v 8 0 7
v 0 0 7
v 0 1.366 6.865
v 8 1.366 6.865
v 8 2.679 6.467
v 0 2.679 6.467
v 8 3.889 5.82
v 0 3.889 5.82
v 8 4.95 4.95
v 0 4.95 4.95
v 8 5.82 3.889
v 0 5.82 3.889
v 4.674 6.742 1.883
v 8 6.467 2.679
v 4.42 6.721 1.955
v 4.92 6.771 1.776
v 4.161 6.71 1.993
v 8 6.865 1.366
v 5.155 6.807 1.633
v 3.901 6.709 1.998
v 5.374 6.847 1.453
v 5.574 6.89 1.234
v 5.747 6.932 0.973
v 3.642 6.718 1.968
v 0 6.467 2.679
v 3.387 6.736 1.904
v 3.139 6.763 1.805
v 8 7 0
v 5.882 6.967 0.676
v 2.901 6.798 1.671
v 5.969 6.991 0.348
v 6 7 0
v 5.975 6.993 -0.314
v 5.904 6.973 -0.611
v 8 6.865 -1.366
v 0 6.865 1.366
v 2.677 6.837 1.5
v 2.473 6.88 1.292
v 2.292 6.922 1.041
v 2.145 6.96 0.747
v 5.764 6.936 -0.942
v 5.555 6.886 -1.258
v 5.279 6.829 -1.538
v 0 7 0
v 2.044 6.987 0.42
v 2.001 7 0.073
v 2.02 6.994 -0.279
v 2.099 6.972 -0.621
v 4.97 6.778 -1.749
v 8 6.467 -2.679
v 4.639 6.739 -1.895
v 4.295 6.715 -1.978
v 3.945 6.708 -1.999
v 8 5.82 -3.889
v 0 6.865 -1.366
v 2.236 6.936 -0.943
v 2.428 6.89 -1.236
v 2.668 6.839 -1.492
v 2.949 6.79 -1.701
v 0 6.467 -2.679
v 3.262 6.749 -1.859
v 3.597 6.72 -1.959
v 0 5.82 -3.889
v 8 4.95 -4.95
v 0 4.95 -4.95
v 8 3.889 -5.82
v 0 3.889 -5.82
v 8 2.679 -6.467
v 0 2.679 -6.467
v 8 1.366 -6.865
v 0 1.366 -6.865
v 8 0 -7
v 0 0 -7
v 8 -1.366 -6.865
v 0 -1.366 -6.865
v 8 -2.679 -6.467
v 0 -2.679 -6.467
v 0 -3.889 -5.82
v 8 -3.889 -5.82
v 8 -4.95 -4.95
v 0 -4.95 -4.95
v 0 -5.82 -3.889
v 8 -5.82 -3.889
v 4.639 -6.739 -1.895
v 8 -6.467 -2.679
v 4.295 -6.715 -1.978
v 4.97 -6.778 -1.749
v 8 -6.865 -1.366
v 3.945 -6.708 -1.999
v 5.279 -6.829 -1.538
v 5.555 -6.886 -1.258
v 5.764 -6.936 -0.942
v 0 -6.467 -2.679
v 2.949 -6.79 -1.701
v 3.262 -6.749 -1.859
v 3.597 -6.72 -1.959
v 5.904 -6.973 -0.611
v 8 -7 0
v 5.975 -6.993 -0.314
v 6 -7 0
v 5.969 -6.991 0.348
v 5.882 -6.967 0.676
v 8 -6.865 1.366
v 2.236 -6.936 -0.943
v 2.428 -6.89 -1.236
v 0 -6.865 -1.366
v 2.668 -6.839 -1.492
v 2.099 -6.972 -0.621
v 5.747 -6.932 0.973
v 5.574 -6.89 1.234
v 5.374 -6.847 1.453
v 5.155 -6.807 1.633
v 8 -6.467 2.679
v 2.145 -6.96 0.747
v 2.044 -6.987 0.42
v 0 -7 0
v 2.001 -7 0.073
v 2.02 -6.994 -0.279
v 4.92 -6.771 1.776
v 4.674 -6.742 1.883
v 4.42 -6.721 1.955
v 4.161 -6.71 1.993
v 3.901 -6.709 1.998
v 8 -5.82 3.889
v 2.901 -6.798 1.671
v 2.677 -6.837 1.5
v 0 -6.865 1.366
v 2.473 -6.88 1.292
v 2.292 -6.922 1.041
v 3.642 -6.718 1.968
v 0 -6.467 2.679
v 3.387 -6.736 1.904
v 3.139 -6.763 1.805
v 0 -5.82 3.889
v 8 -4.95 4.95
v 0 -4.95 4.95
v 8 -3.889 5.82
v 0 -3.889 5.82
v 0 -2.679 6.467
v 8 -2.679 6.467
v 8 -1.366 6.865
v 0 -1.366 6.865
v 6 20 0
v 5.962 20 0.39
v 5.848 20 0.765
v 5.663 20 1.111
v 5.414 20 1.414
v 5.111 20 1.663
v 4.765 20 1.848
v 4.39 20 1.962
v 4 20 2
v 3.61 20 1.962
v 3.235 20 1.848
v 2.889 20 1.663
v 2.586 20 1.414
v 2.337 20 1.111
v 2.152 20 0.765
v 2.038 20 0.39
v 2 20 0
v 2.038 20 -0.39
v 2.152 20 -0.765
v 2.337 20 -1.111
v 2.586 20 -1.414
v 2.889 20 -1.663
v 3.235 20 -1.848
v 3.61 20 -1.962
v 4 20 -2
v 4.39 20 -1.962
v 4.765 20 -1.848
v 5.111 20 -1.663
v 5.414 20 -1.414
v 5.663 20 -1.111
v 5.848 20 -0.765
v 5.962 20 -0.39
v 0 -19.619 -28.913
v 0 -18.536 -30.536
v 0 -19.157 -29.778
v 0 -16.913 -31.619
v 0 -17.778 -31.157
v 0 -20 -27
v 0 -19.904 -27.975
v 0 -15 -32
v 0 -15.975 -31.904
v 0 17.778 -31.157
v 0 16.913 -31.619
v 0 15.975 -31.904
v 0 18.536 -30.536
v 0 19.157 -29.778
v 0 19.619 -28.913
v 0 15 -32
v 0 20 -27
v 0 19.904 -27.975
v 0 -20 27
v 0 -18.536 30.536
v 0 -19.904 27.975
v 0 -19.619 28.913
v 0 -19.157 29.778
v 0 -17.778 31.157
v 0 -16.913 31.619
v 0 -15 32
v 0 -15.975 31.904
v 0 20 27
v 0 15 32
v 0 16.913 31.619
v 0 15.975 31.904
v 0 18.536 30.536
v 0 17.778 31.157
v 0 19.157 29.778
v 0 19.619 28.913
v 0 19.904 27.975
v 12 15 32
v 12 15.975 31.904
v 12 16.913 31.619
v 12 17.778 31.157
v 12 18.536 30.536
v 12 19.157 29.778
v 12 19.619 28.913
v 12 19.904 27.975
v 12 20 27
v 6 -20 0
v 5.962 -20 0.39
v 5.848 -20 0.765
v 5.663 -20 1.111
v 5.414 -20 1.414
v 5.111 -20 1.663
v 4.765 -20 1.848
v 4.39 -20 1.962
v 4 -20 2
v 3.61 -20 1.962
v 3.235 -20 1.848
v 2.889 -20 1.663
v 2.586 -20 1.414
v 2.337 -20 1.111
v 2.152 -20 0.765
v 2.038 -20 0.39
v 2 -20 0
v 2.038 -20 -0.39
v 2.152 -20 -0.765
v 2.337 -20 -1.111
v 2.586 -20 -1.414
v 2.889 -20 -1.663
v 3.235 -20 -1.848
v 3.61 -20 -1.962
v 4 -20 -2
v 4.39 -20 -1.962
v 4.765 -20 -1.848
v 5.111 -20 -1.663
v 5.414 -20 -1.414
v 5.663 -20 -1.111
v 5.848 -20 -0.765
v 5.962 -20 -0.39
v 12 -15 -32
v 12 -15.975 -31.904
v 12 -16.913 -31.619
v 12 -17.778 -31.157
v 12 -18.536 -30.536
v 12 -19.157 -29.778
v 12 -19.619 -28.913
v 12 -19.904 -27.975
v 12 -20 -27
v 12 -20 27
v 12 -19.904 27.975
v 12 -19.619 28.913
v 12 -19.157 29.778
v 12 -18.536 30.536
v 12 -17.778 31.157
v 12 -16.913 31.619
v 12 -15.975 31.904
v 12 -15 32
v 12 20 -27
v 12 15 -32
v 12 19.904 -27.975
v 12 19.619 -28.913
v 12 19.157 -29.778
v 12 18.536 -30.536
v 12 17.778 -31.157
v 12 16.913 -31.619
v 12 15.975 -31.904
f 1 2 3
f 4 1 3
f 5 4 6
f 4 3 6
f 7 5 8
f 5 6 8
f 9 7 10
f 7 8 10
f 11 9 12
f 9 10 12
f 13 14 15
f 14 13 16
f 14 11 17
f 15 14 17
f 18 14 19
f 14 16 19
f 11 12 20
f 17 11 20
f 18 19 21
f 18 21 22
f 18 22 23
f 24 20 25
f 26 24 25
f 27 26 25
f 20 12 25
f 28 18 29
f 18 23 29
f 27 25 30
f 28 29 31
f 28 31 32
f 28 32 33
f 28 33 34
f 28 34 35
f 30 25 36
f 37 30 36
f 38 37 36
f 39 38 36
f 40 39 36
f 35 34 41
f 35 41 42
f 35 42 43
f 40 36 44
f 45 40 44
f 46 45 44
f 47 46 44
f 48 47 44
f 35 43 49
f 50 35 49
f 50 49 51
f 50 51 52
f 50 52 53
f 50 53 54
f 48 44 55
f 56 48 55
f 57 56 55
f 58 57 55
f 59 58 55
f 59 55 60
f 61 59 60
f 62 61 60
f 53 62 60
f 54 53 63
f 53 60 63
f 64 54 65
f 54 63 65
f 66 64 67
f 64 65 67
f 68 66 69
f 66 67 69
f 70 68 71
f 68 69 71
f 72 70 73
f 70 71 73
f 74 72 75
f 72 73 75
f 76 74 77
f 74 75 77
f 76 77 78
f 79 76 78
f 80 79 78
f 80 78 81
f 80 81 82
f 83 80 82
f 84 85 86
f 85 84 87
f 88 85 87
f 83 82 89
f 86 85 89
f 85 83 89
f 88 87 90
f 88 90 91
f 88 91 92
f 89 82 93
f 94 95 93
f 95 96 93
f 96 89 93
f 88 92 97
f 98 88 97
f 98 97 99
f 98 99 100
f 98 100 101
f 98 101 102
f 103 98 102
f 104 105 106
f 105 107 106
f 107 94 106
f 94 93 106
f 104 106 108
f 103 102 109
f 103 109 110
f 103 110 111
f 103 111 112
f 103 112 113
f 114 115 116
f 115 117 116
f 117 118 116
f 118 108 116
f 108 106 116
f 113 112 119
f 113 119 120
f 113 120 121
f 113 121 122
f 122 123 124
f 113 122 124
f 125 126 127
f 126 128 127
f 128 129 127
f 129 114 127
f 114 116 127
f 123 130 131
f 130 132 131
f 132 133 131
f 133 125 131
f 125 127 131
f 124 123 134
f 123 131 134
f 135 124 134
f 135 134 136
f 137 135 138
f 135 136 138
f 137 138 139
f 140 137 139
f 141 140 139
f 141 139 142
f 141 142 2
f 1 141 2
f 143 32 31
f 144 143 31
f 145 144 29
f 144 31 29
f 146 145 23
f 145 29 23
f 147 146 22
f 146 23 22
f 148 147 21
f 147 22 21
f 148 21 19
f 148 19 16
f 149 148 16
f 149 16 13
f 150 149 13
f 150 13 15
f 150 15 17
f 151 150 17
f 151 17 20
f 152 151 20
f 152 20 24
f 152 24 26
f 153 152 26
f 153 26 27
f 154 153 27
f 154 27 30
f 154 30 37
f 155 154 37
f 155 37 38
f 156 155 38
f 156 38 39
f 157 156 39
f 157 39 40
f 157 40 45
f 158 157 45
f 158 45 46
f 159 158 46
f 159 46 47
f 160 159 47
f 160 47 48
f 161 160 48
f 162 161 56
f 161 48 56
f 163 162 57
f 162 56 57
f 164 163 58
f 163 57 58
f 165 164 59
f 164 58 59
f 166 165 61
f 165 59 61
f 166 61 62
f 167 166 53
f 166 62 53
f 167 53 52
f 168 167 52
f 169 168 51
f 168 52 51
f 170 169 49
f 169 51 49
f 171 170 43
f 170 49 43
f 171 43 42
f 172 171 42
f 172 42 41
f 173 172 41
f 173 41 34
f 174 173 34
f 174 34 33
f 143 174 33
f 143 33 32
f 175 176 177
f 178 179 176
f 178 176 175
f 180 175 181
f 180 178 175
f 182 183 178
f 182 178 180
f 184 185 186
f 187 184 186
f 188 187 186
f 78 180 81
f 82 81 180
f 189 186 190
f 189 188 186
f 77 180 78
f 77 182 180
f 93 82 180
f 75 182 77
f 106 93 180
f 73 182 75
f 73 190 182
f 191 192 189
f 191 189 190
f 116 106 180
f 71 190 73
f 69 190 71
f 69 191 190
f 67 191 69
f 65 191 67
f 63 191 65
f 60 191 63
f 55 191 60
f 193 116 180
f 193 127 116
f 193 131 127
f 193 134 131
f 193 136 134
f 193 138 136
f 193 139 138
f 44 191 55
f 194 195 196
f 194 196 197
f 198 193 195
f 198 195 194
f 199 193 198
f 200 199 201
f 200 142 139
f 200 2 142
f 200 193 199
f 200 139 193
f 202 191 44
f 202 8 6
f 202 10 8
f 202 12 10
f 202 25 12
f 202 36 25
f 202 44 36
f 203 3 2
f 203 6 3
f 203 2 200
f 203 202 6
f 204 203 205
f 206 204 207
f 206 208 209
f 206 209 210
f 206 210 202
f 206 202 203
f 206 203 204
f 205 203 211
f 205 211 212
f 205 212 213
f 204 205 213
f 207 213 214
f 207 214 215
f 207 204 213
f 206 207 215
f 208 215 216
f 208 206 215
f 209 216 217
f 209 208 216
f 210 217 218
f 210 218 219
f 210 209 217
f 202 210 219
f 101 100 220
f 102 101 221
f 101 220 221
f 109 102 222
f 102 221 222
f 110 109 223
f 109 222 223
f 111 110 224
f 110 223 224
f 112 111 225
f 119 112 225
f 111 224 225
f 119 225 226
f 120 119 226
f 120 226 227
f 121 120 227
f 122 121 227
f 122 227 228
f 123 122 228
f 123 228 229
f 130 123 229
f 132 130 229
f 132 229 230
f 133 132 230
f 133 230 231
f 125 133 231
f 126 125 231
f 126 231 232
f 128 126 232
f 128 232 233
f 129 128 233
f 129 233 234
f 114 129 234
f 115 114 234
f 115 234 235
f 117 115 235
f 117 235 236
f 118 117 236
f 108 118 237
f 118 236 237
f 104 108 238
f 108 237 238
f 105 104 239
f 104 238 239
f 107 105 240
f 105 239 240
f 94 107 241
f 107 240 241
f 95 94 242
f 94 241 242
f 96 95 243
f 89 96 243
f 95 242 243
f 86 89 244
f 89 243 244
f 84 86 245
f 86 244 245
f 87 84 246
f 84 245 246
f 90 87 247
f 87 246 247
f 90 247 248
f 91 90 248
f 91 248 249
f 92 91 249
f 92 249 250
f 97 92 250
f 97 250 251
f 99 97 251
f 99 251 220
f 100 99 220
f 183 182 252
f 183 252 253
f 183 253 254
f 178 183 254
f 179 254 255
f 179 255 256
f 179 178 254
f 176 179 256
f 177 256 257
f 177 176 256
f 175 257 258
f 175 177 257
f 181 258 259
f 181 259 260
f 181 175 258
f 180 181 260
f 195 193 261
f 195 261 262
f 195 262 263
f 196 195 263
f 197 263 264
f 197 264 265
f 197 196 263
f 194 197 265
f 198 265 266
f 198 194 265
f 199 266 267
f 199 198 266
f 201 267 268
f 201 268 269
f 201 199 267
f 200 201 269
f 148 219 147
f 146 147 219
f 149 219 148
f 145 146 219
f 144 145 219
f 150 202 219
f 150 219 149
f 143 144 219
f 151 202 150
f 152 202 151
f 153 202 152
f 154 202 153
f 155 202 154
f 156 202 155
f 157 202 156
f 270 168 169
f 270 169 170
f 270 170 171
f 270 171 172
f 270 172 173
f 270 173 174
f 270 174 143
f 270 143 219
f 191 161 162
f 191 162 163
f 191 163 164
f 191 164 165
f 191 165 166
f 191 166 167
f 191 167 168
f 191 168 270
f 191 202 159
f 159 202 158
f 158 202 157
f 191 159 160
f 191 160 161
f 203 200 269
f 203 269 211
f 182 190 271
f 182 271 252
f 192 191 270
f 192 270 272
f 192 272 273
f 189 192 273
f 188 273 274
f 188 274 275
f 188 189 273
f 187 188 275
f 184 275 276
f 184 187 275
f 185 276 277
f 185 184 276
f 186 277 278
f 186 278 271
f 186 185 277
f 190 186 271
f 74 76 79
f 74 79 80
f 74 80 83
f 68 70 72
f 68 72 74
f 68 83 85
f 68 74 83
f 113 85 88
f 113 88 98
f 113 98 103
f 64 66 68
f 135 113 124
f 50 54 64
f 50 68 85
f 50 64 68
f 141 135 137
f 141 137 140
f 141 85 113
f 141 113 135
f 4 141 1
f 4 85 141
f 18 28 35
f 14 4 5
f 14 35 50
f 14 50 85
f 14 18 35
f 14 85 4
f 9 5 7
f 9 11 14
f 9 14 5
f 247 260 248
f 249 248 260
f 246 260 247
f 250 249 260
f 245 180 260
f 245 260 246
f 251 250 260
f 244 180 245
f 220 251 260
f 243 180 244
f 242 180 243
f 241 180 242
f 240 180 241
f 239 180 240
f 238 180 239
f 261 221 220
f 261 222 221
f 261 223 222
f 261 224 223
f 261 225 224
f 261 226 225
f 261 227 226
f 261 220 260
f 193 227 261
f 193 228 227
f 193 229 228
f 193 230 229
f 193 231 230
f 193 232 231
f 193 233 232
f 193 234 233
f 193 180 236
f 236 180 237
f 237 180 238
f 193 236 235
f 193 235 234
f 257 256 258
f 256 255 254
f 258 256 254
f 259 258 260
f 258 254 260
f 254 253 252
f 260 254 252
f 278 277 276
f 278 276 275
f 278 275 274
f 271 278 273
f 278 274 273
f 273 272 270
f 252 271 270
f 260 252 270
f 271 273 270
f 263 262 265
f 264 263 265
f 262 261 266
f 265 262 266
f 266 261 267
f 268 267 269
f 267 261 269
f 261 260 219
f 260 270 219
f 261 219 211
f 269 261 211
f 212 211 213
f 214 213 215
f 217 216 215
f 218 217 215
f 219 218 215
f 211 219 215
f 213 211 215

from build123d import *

# Parameters (mm, degrees)
EXTRUDE_1_DEPTH     = 12
SKETCH_2_R          = 7
CUT_EXTRUDE_1_DEPTH = 8
SKETCH_5_R          = 2
CUT_EXTRUDE_2_DEPTH = 41


with BuildPart() as part:
    # 草图1 → 凸台-拉伸1 (new body)
    with BuildSketch(Plane(origin=(0, 0, 0), x_dir=(0, 0, -1), z_dir=(1, 0, 0))):
        with BuildLine():
            Line((-27, 20), (27, 20))
            ThreePointArc((27, 20), (30.535533906, 18.535533906), (32, 15))
            Line((32, 15), (32, -15))
            ThreePointArc((32, -15), (30.535533906, -18.535533906), (27, -20))
            Line((27, -20), (-27, -20))
            ThreePointArc((-27, -20), (-30.535533906, -18.535533906), (-32, -15))
            Line((-32, -15), (-32, 15))
            ThreePointArc((-32, 15), (-30.535533906, 18.535533906), (-27, 20))
        make_face()
    extrude(amount=EXTRUDE_1_DEPTH)

    # 草图2 → 切除-拉伸1 (cut)
    with BuildSketch(Plane.ZY):
        Circle(SKETCH_2_R)
    extrude(amount=-CUT_EXTRUDE_1_DEPTH, mode=Mode.SUBTRACT)

    # 草图5 → 切除-拉伸2 (cut, through all)
    with BuildSketch(Plane.XZ.offset(20)):
        with Locations((4, 0)):
            Circle(SKETCH_5_R)
    extrude(amount=-CUT_EXTRUDE_2_DEPTH, mode=Mode.SUBTRACT)


solid = part.part
